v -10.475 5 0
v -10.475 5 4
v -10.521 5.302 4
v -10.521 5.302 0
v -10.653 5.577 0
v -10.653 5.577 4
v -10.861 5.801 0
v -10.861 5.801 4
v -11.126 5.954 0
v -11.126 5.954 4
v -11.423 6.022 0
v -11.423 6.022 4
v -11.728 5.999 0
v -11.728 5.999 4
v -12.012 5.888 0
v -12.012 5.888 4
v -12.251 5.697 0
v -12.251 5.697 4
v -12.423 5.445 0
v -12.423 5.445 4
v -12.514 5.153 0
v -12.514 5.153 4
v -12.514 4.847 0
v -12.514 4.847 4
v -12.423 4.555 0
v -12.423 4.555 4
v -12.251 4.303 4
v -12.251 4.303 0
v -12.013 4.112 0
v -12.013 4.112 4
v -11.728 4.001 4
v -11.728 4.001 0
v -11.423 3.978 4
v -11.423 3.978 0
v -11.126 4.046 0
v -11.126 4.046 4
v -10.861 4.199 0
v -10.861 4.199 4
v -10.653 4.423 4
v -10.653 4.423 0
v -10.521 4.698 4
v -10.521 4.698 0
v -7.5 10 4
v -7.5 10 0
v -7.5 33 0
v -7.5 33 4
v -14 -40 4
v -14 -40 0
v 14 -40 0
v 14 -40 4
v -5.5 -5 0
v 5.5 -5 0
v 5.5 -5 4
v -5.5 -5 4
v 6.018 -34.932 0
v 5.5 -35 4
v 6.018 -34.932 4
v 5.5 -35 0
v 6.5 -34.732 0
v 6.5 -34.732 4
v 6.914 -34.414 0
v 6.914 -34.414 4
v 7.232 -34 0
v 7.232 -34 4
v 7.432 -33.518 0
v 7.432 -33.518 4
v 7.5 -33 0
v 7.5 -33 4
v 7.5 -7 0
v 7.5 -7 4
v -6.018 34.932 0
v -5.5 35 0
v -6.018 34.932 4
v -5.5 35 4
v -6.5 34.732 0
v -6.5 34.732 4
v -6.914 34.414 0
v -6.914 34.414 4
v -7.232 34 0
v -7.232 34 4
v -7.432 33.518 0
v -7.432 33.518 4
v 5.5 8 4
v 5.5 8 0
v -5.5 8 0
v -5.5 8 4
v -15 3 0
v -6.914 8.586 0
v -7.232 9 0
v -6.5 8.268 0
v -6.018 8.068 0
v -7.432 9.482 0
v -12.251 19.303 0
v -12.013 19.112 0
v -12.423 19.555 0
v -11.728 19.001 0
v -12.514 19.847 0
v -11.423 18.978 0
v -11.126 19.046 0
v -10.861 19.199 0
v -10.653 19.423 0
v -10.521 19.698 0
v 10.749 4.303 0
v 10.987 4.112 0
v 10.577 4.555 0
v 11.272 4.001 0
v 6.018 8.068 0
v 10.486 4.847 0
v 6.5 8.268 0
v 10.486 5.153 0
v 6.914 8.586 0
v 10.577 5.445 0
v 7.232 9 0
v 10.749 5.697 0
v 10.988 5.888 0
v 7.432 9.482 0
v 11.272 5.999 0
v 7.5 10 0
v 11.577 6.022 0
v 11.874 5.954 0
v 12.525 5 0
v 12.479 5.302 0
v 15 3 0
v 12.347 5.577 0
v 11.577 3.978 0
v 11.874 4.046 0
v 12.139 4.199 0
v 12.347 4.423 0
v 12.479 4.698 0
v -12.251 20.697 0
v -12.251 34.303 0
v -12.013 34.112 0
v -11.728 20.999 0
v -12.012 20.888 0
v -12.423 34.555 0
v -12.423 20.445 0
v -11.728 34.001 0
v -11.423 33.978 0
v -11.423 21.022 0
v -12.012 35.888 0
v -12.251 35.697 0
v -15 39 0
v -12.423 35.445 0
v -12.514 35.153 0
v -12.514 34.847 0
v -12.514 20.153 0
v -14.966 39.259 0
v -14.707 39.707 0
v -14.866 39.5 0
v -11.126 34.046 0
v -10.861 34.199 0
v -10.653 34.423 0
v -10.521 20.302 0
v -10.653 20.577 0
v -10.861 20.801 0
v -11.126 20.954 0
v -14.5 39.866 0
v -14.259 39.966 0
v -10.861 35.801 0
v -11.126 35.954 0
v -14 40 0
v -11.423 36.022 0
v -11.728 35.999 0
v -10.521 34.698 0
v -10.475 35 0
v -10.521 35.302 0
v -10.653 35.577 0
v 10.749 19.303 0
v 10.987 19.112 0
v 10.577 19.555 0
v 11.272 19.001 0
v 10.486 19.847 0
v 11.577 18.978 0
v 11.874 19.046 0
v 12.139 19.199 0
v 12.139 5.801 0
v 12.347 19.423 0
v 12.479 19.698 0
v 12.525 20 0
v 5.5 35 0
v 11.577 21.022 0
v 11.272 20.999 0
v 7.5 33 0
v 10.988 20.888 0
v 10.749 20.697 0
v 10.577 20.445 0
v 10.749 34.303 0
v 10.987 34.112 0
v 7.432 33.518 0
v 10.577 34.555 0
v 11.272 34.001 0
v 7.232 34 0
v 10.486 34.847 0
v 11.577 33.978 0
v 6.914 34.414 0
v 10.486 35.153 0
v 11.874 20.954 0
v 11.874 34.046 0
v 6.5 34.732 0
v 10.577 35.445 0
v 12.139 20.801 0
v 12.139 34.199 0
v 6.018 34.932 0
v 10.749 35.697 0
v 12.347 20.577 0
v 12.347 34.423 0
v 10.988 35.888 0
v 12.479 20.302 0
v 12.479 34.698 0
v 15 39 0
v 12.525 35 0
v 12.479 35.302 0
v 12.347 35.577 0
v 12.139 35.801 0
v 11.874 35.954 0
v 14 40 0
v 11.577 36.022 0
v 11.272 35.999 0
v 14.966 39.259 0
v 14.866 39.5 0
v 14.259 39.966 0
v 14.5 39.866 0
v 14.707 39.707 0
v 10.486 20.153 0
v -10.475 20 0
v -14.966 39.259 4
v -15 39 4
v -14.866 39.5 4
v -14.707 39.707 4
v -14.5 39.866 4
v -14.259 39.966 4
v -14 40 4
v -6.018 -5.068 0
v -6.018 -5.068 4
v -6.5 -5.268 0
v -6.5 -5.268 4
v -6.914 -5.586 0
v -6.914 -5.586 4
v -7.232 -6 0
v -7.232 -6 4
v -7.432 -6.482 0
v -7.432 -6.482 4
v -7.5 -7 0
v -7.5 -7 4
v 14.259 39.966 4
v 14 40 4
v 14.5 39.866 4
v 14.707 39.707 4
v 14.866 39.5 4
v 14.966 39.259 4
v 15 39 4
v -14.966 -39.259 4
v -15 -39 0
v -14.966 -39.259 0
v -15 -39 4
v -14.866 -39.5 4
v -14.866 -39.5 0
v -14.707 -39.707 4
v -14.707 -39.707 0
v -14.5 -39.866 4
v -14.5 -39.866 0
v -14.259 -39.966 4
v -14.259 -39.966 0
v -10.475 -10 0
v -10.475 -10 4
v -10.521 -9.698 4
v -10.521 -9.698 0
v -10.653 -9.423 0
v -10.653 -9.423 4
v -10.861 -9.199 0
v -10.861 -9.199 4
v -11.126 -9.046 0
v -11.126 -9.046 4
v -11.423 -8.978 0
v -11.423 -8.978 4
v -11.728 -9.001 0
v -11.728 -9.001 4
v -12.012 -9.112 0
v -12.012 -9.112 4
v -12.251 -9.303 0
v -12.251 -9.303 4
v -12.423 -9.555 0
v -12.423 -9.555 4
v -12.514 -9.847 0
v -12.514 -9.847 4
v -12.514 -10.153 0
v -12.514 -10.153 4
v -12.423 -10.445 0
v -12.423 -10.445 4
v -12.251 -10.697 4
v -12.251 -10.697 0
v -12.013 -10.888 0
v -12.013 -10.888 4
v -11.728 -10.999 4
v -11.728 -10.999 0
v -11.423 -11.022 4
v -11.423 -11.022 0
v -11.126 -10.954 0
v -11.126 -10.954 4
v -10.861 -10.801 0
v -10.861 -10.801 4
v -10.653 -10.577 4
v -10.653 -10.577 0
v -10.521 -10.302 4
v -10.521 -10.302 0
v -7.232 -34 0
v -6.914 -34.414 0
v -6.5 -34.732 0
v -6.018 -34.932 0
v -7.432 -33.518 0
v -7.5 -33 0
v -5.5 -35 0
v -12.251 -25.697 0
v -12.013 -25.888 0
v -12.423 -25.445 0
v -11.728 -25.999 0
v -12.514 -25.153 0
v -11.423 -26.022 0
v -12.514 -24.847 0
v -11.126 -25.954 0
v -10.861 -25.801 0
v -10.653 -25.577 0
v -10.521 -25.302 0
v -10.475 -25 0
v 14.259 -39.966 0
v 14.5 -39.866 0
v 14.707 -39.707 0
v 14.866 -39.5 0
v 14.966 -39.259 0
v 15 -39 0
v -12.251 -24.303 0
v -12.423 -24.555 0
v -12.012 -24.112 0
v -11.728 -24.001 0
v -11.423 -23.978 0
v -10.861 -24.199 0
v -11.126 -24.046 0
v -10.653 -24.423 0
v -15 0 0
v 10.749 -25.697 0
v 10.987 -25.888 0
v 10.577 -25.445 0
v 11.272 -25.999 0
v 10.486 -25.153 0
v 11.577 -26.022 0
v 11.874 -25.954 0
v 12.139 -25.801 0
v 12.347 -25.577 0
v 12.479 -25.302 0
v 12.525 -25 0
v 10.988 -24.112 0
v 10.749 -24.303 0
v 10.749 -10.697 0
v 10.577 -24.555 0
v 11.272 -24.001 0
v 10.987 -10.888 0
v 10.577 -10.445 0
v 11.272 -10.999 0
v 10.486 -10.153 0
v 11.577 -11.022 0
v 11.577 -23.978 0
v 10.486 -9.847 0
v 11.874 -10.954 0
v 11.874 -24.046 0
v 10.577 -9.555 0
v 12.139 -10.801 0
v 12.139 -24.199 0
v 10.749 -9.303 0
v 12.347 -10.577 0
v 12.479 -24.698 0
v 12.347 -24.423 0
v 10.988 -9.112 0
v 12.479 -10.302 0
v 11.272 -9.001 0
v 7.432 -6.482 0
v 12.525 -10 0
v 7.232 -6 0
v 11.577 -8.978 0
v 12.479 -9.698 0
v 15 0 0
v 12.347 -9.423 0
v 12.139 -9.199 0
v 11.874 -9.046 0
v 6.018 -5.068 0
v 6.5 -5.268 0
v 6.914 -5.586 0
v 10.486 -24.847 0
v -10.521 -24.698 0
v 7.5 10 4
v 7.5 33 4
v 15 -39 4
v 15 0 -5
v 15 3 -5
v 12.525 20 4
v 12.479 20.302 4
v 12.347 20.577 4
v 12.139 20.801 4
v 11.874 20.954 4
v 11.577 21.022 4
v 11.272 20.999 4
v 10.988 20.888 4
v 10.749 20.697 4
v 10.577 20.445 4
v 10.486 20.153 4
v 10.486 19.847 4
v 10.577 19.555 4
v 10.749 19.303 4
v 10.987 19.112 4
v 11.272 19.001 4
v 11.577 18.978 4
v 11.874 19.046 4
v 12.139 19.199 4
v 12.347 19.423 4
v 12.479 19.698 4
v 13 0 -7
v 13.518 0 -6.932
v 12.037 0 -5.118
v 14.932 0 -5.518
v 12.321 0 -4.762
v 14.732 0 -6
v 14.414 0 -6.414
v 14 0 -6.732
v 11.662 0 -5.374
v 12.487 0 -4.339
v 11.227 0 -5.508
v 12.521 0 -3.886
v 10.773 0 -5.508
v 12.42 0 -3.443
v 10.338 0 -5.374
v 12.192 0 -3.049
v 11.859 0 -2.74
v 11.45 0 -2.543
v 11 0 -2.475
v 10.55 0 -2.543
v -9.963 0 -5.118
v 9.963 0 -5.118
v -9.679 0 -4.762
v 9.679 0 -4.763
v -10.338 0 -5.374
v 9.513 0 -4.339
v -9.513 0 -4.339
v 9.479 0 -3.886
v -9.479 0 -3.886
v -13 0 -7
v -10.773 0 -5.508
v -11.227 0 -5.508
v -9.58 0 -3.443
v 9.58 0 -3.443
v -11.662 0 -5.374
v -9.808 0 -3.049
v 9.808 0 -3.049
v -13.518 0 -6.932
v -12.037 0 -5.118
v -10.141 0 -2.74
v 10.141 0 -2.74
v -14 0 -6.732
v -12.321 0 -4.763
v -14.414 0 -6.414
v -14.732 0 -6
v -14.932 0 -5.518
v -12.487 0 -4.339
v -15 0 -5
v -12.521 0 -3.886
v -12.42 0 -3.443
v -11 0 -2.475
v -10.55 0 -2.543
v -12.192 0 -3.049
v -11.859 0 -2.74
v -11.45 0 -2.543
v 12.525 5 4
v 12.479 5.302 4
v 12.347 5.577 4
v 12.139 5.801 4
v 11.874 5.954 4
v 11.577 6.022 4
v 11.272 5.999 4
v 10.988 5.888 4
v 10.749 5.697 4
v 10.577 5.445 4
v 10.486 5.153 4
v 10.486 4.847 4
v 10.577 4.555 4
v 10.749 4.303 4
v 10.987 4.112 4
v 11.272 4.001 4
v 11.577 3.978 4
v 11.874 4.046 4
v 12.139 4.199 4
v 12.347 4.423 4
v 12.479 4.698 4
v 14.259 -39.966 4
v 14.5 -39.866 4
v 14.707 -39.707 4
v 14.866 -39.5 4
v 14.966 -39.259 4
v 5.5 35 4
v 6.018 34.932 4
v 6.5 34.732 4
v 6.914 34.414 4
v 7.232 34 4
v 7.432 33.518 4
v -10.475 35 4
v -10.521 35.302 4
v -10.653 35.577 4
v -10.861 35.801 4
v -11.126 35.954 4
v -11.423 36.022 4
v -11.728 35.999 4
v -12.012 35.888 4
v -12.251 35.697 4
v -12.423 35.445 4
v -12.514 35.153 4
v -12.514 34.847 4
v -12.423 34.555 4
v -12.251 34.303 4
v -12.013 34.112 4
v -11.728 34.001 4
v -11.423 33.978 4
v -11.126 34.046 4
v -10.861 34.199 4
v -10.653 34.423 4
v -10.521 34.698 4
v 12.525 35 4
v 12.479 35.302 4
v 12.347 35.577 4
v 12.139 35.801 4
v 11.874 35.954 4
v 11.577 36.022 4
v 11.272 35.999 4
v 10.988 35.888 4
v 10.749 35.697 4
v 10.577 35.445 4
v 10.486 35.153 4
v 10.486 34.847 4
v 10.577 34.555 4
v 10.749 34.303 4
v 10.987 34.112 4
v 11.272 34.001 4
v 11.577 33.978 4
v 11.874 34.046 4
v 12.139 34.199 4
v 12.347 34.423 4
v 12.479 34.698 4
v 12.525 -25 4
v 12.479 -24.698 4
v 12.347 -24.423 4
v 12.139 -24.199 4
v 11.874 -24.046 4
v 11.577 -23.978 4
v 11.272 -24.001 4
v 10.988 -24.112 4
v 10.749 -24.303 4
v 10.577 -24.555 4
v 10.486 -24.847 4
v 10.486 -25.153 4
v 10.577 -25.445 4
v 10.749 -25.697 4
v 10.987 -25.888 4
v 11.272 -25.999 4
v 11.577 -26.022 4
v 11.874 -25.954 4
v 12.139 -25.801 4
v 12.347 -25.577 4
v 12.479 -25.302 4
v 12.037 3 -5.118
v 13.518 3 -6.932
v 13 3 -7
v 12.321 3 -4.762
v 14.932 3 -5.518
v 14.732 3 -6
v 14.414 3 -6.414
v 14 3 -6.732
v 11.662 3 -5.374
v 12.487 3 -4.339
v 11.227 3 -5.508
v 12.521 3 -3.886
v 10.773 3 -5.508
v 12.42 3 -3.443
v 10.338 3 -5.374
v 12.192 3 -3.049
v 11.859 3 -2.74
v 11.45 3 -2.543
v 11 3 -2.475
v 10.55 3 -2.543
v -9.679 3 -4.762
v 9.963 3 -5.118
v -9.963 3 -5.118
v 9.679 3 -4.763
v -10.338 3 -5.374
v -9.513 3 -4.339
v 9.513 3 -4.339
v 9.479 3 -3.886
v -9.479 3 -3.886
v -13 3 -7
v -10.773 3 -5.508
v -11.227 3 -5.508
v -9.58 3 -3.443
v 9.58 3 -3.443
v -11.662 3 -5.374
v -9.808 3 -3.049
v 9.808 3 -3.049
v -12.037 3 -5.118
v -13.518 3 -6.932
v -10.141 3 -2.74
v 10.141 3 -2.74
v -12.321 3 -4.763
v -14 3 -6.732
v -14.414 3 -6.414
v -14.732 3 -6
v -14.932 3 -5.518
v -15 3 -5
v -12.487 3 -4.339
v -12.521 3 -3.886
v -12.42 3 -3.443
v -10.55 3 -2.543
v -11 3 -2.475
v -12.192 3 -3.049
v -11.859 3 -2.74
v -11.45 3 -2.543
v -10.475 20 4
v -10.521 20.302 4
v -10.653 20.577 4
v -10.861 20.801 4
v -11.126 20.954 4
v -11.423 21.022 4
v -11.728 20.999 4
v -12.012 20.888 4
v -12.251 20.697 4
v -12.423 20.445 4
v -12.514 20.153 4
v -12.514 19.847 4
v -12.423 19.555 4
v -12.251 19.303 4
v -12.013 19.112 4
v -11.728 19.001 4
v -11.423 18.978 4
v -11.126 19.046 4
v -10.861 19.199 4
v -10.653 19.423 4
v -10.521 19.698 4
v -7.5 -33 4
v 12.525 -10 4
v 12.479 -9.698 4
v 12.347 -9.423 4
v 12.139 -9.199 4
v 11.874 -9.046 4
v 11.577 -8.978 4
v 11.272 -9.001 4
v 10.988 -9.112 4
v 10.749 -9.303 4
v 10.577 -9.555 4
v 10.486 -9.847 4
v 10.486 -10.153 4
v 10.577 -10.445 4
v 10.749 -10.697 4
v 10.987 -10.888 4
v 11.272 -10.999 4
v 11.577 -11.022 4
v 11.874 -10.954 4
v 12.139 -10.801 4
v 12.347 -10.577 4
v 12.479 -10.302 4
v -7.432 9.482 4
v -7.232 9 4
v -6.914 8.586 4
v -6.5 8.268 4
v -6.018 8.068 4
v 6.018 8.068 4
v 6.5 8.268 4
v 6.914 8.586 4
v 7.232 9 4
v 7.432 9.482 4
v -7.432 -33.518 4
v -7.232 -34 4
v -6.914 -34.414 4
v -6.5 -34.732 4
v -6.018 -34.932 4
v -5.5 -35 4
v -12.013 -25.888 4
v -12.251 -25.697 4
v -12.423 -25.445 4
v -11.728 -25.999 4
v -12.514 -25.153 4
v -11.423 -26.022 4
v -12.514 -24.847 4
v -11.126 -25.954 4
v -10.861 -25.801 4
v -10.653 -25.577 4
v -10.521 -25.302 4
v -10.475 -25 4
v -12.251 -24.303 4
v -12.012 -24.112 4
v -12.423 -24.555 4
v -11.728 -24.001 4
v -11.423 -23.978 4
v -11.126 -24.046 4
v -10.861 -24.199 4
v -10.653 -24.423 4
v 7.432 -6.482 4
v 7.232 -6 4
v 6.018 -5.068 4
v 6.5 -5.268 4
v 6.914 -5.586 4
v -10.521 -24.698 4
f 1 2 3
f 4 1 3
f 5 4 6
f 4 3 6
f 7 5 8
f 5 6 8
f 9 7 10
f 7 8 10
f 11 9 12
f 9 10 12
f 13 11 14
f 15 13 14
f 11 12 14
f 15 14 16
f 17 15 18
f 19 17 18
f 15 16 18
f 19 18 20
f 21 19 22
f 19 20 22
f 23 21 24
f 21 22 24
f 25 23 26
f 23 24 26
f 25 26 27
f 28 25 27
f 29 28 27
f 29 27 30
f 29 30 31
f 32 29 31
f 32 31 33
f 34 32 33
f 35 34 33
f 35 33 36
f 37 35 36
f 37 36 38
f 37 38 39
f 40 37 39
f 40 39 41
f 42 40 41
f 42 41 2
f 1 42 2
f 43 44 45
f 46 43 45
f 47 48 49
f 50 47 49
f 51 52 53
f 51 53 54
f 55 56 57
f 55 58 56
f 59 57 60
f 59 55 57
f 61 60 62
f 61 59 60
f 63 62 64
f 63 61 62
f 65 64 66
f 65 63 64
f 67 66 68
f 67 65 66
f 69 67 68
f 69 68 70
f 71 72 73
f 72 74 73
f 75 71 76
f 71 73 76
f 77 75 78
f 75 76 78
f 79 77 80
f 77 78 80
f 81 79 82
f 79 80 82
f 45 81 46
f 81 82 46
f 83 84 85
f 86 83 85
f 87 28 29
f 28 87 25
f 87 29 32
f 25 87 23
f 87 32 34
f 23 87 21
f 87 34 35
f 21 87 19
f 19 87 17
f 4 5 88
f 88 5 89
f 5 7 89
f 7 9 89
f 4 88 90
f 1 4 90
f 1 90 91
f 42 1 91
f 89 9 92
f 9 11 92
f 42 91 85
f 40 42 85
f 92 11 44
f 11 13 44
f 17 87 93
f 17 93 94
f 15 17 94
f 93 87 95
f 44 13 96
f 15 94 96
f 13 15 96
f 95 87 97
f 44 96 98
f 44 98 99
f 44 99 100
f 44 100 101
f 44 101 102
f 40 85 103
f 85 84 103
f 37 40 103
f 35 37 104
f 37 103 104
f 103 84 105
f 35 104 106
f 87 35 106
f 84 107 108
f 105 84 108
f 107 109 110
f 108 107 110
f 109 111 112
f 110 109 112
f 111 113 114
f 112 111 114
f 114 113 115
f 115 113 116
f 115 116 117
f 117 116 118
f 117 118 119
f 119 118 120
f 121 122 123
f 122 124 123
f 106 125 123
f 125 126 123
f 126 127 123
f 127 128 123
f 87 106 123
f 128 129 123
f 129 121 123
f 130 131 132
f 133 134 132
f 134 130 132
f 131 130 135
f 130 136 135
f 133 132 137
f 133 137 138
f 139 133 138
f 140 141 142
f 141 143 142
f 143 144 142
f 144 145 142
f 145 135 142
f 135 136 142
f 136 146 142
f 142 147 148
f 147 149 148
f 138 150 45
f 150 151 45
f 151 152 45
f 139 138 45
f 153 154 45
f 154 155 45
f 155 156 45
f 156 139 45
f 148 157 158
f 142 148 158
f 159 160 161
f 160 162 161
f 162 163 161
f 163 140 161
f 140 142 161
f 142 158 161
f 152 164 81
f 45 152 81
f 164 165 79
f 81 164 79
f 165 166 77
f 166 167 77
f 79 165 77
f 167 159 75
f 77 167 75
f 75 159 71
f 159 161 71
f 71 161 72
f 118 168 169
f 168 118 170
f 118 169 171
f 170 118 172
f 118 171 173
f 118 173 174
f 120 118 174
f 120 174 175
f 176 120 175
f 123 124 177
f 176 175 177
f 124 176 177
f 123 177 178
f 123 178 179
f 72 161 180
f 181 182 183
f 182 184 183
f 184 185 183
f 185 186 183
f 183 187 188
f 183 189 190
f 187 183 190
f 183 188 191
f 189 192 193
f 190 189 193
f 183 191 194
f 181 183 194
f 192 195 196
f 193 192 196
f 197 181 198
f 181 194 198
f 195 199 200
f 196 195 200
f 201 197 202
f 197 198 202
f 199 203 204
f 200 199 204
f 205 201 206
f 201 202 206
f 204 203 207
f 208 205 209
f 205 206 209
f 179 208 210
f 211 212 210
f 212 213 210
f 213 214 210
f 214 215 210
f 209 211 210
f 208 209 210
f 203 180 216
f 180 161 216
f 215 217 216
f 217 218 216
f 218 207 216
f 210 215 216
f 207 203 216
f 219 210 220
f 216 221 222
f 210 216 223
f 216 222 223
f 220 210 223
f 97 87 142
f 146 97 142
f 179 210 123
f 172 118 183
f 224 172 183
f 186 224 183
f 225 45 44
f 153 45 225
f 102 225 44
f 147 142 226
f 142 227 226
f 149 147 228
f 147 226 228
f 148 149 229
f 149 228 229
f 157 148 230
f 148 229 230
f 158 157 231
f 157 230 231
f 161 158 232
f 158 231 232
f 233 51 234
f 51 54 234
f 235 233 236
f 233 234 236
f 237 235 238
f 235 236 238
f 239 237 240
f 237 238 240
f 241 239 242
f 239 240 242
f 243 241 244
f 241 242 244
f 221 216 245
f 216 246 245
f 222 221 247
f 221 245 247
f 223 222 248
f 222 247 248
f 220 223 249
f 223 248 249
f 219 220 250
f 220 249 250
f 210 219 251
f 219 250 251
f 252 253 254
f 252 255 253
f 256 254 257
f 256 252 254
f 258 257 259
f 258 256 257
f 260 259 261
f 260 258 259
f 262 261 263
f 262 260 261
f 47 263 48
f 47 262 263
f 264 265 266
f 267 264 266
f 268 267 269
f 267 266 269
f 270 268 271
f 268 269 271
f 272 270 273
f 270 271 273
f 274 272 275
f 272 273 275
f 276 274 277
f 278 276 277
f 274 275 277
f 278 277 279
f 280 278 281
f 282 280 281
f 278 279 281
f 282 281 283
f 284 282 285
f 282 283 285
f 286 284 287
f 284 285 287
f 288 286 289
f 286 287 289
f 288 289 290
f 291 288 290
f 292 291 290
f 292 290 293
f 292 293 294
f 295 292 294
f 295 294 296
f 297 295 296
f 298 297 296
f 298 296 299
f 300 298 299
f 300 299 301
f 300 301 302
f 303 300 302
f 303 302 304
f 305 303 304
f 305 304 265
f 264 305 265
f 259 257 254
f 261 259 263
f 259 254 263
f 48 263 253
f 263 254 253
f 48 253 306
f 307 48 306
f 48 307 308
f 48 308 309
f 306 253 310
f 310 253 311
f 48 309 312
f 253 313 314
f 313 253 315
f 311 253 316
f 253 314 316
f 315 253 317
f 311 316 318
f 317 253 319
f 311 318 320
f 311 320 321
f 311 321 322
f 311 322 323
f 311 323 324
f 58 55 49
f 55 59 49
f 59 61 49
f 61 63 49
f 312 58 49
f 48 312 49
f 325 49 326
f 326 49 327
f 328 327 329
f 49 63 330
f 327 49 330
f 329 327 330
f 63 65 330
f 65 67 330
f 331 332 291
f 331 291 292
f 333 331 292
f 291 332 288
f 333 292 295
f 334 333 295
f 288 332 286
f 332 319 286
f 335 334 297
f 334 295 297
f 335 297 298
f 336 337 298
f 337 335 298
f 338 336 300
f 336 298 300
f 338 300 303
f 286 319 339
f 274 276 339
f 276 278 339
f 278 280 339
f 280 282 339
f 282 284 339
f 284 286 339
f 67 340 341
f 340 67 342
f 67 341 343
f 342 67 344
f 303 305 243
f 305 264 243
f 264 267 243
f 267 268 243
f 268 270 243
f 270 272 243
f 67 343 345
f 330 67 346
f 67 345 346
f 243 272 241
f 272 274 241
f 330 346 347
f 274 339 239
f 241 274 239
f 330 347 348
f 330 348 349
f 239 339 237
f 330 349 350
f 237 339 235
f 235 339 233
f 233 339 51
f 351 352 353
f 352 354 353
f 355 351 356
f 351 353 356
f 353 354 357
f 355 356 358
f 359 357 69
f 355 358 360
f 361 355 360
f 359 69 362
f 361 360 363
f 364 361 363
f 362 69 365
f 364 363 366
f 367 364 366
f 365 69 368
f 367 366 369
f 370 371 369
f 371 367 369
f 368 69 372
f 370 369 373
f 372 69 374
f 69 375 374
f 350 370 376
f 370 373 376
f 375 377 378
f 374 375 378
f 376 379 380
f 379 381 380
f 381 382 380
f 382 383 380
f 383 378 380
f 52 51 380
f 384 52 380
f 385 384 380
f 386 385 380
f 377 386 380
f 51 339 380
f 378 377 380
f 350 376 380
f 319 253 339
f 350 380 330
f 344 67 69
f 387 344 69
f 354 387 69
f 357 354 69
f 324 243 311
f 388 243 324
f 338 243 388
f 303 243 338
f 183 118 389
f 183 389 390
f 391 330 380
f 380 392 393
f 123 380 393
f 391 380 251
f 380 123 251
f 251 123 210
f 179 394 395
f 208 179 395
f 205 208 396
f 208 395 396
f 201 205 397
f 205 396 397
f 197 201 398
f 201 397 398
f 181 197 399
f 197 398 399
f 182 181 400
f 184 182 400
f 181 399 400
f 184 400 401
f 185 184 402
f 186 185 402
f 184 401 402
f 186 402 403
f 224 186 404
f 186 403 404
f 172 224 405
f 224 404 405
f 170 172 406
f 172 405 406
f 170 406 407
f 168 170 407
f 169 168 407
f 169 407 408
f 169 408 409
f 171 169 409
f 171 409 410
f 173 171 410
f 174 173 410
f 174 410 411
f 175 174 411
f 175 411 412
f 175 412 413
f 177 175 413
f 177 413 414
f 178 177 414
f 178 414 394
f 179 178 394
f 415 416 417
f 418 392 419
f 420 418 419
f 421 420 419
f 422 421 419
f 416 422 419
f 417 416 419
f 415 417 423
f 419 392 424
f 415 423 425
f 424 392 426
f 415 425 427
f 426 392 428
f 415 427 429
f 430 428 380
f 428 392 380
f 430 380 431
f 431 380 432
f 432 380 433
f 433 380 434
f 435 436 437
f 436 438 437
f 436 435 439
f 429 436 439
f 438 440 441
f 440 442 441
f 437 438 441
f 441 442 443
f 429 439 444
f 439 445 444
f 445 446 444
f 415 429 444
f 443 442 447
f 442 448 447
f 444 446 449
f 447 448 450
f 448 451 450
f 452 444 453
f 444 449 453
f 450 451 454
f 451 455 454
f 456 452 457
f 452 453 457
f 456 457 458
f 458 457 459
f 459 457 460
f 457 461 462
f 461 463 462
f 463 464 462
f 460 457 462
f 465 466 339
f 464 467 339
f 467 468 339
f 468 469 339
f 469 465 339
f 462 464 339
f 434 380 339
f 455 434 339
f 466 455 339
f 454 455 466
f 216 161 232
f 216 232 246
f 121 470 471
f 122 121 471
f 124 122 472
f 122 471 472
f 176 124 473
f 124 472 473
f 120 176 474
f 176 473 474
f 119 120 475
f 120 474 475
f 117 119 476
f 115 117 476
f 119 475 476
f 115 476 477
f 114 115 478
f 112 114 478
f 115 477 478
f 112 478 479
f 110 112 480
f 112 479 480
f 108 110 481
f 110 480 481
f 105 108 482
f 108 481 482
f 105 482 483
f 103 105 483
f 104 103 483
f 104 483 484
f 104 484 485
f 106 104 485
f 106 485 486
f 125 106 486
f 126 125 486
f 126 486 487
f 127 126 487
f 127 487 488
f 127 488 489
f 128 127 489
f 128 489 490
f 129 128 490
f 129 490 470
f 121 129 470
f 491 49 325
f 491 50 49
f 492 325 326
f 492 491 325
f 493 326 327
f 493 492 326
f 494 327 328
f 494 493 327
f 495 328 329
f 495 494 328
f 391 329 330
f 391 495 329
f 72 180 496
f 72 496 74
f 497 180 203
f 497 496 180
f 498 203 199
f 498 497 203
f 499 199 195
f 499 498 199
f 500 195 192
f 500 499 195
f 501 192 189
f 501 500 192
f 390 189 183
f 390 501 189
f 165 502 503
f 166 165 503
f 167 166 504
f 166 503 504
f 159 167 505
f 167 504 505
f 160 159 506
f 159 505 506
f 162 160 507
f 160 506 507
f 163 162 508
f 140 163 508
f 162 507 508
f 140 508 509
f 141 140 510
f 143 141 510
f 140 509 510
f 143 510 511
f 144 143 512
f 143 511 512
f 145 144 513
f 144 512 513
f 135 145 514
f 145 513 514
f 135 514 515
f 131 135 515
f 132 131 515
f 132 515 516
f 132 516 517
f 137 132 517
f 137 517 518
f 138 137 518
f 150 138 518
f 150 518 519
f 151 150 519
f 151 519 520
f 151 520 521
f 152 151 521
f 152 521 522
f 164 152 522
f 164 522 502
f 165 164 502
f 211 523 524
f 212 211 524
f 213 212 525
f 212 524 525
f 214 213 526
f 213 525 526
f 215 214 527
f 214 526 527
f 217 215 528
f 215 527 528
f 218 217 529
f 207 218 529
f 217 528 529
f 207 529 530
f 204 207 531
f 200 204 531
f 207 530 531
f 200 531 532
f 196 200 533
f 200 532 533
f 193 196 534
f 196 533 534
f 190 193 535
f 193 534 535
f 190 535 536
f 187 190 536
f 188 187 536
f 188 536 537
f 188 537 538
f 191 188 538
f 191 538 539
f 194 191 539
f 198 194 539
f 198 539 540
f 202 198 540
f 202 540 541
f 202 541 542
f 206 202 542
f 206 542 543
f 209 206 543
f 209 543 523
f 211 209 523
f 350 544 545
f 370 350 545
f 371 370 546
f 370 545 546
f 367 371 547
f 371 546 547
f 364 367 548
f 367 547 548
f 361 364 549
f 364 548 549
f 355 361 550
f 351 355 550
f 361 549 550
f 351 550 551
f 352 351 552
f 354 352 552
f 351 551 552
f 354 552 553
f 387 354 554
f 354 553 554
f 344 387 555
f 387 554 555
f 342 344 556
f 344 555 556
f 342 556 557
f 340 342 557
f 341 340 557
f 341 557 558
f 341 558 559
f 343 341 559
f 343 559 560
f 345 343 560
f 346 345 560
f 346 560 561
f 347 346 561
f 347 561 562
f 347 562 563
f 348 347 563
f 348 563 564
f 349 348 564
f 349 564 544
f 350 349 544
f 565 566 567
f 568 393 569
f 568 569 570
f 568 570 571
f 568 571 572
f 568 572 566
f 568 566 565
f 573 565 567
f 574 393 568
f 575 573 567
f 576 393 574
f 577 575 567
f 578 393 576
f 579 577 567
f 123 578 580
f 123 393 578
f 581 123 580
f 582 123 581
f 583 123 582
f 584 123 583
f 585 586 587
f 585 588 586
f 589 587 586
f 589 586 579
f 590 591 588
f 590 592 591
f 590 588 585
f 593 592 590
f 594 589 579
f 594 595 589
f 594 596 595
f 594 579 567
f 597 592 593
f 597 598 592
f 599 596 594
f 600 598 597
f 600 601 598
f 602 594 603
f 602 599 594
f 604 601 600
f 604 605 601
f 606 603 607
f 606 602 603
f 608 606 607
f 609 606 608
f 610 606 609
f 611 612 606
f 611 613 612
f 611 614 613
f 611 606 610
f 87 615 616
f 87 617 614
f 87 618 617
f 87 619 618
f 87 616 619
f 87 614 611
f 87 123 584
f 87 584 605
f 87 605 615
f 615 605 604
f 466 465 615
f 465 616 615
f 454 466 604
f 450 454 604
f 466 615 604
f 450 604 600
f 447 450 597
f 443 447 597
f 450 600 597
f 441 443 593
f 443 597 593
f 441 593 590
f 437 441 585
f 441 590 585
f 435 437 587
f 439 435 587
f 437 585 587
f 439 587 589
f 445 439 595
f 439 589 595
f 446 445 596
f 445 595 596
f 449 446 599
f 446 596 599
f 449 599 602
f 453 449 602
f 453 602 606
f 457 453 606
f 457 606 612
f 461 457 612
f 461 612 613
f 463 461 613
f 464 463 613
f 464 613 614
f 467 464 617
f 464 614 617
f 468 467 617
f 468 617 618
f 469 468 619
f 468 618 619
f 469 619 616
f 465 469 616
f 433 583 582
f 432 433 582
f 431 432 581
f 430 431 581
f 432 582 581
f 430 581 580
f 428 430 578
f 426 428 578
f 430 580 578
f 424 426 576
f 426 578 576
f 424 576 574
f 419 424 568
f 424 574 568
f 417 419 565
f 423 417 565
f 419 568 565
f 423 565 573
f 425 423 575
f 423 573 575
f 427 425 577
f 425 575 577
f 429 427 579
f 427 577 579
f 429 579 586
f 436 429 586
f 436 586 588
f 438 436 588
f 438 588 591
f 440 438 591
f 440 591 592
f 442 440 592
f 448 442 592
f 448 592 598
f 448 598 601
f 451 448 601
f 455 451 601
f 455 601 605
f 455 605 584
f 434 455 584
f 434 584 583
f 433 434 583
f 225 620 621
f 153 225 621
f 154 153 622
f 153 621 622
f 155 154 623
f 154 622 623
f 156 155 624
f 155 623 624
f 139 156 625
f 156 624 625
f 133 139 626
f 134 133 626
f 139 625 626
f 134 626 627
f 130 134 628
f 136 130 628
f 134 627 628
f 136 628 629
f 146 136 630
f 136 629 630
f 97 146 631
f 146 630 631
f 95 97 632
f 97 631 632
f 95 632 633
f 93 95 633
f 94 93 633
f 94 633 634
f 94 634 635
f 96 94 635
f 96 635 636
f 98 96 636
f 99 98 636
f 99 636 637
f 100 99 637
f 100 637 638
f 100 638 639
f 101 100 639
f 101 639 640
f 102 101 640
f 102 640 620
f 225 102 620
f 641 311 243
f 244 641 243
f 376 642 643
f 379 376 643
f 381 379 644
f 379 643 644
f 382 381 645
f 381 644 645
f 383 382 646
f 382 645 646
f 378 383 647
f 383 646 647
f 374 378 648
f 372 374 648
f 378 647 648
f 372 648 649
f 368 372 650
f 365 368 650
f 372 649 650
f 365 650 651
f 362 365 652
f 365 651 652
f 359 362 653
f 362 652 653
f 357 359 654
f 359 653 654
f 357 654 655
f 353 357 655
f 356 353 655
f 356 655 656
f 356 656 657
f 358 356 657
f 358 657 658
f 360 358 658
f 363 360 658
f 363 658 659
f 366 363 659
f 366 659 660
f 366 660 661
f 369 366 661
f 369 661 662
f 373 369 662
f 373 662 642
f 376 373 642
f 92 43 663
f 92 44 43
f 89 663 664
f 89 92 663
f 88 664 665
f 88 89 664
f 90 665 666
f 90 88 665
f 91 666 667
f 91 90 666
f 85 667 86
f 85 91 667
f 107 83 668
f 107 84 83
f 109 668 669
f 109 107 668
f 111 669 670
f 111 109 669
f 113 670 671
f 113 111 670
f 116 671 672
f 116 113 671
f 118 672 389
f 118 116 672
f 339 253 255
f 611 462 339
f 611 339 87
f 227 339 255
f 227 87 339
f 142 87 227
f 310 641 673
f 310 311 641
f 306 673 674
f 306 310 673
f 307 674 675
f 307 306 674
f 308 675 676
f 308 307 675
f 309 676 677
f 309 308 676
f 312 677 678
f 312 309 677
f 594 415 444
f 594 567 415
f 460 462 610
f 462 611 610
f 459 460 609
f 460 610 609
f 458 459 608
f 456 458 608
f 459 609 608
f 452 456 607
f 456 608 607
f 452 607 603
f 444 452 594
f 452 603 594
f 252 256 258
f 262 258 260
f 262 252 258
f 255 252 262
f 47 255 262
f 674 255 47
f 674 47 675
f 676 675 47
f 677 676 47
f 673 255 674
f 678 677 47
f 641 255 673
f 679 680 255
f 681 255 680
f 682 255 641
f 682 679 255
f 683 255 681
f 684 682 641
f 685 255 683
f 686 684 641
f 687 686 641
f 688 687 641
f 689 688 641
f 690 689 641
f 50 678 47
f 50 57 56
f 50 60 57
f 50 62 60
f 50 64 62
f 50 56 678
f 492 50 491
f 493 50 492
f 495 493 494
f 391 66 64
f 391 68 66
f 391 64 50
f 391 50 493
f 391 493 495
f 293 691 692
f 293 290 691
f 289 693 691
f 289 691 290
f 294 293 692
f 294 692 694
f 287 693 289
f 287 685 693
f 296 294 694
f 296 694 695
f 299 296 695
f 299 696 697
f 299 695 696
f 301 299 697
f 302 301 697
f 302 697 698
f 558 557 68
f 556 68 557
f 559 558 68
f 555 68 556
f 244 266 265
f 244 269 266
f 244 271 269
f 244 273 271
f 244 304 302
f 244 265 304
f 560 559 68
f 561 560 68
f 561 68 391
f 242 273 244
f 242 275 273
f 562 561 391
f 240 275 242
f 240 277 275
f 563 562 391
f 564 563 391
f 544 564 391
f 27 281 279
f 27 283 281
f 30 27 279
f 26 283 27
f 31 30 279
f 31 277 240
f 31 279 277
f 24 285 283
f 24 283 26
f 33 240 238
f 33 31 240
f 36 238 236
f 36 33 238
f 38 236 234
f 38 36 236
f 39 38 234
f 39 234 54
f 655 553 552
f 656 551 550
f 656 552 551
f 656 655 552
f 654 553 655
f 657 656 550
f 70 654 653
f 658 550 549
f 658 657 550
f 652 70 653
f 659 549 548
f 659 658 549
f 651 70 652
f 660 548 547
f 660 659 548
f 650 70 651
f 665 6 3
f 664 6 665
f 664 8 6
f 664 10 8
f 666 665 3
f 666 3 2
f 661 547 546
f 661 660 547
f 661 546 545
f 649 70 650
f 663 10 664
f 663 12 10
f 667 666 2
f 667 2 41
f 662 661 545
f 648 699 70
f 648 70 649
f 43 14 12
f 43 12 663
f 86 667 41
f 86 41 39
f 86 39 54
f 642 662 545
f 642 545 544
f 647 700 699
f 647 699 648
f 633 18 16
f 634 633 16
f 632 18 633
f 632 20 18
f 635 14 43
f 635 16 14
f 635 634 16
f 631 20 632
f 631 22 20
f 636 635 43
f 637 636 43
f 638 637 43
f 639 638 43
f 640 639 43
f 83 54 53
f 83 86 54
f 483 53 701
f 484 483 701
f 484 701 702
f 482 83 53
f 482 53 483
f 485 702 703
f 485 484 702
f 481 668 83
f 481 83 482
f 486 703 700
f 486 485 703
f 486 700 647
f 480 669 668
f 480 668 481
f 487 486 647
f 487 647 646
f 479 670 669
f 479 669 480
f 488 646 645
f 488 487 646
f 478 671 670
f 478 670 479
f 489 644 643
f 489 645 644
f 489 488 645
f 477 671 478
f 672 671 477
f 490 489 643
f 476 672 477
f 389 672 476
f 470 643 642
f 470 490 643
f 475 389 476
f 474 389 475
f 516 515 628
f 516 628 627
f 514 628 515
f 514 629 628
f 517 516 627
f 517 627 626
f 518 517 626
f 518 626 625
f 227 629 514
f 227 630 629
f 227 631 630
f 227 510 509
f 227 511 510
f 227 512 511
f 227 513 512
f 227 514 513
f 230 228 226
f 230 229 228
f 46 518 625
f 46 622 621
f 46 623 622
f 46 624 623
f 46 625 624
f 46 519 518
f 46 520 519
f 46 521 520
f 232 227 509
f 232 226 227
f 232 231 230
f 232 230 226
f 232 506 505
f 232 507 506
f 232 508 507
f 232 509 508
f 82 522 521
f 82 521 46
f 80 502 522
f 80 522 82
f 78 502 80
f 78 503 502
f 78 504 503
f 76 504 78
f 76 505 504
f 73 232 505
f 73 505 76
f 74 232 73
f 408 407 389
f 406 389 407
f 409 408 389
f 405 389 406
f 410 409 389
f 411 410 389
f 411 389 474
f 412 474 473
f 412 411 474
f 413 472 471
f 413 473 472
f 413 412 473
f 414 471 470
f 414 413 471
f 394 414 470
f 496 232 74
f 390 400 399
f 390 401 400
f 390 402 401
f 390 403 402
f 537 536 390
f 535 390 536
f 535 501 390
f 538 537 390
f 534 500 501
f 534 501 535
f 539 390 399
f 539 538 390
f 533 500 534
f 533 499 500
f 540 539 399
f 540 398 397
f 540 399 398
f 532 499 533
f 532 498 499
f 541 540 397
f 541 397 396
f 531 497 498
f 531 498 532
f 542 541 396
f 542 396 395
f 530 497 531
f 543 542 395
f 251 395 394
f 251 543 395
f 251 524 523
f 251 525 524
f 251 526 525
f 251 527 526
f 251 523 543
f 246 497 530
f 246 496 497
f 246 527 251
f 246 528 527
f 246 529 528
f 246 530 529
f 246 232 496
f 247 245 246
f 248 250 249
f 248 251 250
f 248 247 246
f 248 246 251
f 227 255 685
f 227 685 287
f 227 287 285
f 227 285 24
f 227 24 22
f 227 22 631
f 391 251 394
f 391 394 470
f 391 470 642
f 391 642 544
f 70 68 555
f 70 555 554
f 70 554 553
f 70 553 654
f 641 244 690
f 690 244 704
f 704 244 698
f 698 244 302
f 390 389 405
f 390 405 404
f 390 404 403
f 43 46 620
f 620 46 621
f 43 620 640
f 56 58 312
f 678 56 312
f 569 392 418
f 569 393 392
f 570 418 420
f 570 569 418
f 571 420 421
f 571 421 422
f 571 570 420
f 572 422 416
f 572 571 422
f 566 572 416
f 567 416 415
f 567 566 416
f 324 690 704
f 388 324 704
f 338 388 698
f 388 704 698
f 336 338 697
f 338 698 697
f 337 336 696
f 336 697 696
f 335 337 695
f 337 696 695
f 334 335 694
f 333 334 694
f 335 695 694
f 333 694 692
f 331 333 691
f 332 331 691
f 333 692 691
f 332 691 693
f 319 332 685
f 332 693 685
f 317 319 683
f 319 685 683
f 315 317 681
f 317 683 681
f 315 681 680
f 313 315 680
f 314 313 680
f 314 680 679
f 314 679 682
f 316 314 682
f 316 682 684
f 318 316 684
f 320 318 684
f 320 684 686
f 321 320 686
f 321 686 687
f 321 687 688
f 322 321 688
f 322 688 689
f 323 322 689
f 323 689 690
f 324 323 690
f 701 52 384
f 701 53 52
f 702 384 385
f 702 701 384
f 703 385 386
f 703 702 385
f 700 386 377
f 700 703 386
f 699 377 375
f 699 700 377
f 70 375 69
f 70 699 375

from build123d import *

# Parameters (mm, degrees)
SKETCH_1_W             = 30
SKETCH_1_H             = 80
EXTRUDE_1_DEPTH        = 4
SKETCH_2_R             = 1.025
CUT_EXTRUDE_1_DEPTH    = 10
PATTERN_LINEAR_1_COUNT = 5
PATTERN_LINEAR_1_PITCH = 15
SKETCH_5_W             = 30
SKETCH_5_H             = 3
EXTRUDE_3_DEPTH        = 7
FILLET_1_R             = 1
SKETCH_6_W             = 15
SKETCH_6_H             = 27
CUT_EXTRUDE_2_DEPTH    = 33
FILLET_2_R             = 2
SKETCH_7_W             = 15
SKETCH_7_H             = 30
CUT_EXTRUDE_3_DEPTH    = 33
FILLET_3_R             = 2
SKETCH_10_R            = 1.525
CUT_EXTRUDE_6_DEPTH    = 33
FILLET_5_R             = 2


with BuildPart() as part:
    # 草图1 → 凸台-拉伸1 (new body)
    with BuildSketch(Plane.XY):
        Rectangle(SKETCH_1_W, SKETCH_1_H)
    extrude(amount=EXTRUDE_1_DEPTH)

    # 草图2 → 切除-拉伸1 (cut)
    with BuildSketch(Plane.XY.offset(4)):
        with Locations((11.5, 35)):
            Circle(SKETCH_2_R)
        with Locations((-11.5, 35)):
            Circle(SKETCH_2_R)
    cut_extrude_1 = extrude(amount=-CUT_EXTRUDE_1_DEPTH, mode=Mode.SUBTRACT)

    # 阵列(线性)1: 切除-拉伸1 ×5
    with Locations(*[(0, -i * PATTERN_LINEAR_1_PITCH, 0) for i in range(1, PATTERN_LINEAR_1_COUNT)]):
        add(cut_extrude_1, mode=Mode.SUBTRACT)

    # 草图5 → 凸台-拉伸3 (add)
    with BuildSketch(Plane(origin=(0, 0, 0), x_dir=(-1, 0, 0), z_dir=(0, 0, -1))):
        with Locations((0, 1.5)):
            Rectangle(SKETCH_5_W, SKETCH_5_H)
    extrude(amount=EXTRUDE_3_DEPTH)

    # 圆角1
    fillet_1_edges = [part.edges().sort_by_distance(p)[0] for p in [
        (15, -40, 2),
        (-15, -40, 2),
        (-15, 40, 2),
        (15, 40, 2),
    ]]
    fillet(fillet_1_edges, radius=FILLET_1_R)

    # 草图6 → 切除-拉伸2 (cut, symmetric)
    with BuildSketch(Plane(origin=(0, 0, 0), x_dir=(-1, 0, 0), z_dir=(0, 0, -1))):
        with Locations((0, 21.5)):
            Rectangle(SKETCH_6_W, SKETCH_6_H)
    extrude(amount=CUT_EXTRUDE_2_DEPTH, both=True, mode=Mode.SUBTRACT)

    # 圆角2
    fillet_2_edges = [part.edges().sort_by_distance(p)[0] for p in [
        (-7.5, 35, 2),
        (-7.5, 8, 2),
        (7.5, 8, 2),
        (7.5, 35, 2),
    ]]
    fillet(fillet_2_edges, radius=FILLET_2_R)

    # 草图7 → 切除-拉伸3 (cut, symmetric)
    with BuildSketch(Plane(origin=(0, 0, 0), x_dir=(-1, 0, 0), z_dir=(0, 0, -1))):
        with Locations((0, -20)):
            Rectangle(SKETCH_7_W, SKETCH_7_H)
    extrude(amount=CUT_EXTRUDE_3_DEPTH, both=True, mode=Mode.SUBTRACT)

    # 圆角3
    fillet_3_edges = [part.edges().sort_by_distance(p)[0] for p in [
        (-7.5, -5, 2),
        (-7.5, -35, 2),
        (7.5, -35, 2),
        (7.5, -5, 2),
    ]]
    fillet(fillet_3_edges, radius=FILLET_3_R)

    # 草图10 → 切除-拉伸6 (cut, symmetric)
    with BuildSketch(Plane(origin=(0, 3, 0), x_dir=(1, 0, 0), z_dir=(0, 1, 0))):
        with Locations(Location((11, 4, 0), (0, 0, 270))):
            Circle(SKETCH_10_R)
        with Locations(Location((-11, 4, 0), (0, 0, 270))):
            Circle(SKETCH_10_R)
    extrude(amount=CUT_EXTRUDE_6_DEPTH, both=True, mode=Mode.SUBTRACT)

    # 圆角5
    fillet_5_edges = [part.edges().sort_by_distance(p)[0] for p in [
        (15, 1.5, -7),
        (-15, 1.5, -7),
    ]]
    fillet(fillet_5_edges, radius=FILLET_5_R)


solid = part.part
